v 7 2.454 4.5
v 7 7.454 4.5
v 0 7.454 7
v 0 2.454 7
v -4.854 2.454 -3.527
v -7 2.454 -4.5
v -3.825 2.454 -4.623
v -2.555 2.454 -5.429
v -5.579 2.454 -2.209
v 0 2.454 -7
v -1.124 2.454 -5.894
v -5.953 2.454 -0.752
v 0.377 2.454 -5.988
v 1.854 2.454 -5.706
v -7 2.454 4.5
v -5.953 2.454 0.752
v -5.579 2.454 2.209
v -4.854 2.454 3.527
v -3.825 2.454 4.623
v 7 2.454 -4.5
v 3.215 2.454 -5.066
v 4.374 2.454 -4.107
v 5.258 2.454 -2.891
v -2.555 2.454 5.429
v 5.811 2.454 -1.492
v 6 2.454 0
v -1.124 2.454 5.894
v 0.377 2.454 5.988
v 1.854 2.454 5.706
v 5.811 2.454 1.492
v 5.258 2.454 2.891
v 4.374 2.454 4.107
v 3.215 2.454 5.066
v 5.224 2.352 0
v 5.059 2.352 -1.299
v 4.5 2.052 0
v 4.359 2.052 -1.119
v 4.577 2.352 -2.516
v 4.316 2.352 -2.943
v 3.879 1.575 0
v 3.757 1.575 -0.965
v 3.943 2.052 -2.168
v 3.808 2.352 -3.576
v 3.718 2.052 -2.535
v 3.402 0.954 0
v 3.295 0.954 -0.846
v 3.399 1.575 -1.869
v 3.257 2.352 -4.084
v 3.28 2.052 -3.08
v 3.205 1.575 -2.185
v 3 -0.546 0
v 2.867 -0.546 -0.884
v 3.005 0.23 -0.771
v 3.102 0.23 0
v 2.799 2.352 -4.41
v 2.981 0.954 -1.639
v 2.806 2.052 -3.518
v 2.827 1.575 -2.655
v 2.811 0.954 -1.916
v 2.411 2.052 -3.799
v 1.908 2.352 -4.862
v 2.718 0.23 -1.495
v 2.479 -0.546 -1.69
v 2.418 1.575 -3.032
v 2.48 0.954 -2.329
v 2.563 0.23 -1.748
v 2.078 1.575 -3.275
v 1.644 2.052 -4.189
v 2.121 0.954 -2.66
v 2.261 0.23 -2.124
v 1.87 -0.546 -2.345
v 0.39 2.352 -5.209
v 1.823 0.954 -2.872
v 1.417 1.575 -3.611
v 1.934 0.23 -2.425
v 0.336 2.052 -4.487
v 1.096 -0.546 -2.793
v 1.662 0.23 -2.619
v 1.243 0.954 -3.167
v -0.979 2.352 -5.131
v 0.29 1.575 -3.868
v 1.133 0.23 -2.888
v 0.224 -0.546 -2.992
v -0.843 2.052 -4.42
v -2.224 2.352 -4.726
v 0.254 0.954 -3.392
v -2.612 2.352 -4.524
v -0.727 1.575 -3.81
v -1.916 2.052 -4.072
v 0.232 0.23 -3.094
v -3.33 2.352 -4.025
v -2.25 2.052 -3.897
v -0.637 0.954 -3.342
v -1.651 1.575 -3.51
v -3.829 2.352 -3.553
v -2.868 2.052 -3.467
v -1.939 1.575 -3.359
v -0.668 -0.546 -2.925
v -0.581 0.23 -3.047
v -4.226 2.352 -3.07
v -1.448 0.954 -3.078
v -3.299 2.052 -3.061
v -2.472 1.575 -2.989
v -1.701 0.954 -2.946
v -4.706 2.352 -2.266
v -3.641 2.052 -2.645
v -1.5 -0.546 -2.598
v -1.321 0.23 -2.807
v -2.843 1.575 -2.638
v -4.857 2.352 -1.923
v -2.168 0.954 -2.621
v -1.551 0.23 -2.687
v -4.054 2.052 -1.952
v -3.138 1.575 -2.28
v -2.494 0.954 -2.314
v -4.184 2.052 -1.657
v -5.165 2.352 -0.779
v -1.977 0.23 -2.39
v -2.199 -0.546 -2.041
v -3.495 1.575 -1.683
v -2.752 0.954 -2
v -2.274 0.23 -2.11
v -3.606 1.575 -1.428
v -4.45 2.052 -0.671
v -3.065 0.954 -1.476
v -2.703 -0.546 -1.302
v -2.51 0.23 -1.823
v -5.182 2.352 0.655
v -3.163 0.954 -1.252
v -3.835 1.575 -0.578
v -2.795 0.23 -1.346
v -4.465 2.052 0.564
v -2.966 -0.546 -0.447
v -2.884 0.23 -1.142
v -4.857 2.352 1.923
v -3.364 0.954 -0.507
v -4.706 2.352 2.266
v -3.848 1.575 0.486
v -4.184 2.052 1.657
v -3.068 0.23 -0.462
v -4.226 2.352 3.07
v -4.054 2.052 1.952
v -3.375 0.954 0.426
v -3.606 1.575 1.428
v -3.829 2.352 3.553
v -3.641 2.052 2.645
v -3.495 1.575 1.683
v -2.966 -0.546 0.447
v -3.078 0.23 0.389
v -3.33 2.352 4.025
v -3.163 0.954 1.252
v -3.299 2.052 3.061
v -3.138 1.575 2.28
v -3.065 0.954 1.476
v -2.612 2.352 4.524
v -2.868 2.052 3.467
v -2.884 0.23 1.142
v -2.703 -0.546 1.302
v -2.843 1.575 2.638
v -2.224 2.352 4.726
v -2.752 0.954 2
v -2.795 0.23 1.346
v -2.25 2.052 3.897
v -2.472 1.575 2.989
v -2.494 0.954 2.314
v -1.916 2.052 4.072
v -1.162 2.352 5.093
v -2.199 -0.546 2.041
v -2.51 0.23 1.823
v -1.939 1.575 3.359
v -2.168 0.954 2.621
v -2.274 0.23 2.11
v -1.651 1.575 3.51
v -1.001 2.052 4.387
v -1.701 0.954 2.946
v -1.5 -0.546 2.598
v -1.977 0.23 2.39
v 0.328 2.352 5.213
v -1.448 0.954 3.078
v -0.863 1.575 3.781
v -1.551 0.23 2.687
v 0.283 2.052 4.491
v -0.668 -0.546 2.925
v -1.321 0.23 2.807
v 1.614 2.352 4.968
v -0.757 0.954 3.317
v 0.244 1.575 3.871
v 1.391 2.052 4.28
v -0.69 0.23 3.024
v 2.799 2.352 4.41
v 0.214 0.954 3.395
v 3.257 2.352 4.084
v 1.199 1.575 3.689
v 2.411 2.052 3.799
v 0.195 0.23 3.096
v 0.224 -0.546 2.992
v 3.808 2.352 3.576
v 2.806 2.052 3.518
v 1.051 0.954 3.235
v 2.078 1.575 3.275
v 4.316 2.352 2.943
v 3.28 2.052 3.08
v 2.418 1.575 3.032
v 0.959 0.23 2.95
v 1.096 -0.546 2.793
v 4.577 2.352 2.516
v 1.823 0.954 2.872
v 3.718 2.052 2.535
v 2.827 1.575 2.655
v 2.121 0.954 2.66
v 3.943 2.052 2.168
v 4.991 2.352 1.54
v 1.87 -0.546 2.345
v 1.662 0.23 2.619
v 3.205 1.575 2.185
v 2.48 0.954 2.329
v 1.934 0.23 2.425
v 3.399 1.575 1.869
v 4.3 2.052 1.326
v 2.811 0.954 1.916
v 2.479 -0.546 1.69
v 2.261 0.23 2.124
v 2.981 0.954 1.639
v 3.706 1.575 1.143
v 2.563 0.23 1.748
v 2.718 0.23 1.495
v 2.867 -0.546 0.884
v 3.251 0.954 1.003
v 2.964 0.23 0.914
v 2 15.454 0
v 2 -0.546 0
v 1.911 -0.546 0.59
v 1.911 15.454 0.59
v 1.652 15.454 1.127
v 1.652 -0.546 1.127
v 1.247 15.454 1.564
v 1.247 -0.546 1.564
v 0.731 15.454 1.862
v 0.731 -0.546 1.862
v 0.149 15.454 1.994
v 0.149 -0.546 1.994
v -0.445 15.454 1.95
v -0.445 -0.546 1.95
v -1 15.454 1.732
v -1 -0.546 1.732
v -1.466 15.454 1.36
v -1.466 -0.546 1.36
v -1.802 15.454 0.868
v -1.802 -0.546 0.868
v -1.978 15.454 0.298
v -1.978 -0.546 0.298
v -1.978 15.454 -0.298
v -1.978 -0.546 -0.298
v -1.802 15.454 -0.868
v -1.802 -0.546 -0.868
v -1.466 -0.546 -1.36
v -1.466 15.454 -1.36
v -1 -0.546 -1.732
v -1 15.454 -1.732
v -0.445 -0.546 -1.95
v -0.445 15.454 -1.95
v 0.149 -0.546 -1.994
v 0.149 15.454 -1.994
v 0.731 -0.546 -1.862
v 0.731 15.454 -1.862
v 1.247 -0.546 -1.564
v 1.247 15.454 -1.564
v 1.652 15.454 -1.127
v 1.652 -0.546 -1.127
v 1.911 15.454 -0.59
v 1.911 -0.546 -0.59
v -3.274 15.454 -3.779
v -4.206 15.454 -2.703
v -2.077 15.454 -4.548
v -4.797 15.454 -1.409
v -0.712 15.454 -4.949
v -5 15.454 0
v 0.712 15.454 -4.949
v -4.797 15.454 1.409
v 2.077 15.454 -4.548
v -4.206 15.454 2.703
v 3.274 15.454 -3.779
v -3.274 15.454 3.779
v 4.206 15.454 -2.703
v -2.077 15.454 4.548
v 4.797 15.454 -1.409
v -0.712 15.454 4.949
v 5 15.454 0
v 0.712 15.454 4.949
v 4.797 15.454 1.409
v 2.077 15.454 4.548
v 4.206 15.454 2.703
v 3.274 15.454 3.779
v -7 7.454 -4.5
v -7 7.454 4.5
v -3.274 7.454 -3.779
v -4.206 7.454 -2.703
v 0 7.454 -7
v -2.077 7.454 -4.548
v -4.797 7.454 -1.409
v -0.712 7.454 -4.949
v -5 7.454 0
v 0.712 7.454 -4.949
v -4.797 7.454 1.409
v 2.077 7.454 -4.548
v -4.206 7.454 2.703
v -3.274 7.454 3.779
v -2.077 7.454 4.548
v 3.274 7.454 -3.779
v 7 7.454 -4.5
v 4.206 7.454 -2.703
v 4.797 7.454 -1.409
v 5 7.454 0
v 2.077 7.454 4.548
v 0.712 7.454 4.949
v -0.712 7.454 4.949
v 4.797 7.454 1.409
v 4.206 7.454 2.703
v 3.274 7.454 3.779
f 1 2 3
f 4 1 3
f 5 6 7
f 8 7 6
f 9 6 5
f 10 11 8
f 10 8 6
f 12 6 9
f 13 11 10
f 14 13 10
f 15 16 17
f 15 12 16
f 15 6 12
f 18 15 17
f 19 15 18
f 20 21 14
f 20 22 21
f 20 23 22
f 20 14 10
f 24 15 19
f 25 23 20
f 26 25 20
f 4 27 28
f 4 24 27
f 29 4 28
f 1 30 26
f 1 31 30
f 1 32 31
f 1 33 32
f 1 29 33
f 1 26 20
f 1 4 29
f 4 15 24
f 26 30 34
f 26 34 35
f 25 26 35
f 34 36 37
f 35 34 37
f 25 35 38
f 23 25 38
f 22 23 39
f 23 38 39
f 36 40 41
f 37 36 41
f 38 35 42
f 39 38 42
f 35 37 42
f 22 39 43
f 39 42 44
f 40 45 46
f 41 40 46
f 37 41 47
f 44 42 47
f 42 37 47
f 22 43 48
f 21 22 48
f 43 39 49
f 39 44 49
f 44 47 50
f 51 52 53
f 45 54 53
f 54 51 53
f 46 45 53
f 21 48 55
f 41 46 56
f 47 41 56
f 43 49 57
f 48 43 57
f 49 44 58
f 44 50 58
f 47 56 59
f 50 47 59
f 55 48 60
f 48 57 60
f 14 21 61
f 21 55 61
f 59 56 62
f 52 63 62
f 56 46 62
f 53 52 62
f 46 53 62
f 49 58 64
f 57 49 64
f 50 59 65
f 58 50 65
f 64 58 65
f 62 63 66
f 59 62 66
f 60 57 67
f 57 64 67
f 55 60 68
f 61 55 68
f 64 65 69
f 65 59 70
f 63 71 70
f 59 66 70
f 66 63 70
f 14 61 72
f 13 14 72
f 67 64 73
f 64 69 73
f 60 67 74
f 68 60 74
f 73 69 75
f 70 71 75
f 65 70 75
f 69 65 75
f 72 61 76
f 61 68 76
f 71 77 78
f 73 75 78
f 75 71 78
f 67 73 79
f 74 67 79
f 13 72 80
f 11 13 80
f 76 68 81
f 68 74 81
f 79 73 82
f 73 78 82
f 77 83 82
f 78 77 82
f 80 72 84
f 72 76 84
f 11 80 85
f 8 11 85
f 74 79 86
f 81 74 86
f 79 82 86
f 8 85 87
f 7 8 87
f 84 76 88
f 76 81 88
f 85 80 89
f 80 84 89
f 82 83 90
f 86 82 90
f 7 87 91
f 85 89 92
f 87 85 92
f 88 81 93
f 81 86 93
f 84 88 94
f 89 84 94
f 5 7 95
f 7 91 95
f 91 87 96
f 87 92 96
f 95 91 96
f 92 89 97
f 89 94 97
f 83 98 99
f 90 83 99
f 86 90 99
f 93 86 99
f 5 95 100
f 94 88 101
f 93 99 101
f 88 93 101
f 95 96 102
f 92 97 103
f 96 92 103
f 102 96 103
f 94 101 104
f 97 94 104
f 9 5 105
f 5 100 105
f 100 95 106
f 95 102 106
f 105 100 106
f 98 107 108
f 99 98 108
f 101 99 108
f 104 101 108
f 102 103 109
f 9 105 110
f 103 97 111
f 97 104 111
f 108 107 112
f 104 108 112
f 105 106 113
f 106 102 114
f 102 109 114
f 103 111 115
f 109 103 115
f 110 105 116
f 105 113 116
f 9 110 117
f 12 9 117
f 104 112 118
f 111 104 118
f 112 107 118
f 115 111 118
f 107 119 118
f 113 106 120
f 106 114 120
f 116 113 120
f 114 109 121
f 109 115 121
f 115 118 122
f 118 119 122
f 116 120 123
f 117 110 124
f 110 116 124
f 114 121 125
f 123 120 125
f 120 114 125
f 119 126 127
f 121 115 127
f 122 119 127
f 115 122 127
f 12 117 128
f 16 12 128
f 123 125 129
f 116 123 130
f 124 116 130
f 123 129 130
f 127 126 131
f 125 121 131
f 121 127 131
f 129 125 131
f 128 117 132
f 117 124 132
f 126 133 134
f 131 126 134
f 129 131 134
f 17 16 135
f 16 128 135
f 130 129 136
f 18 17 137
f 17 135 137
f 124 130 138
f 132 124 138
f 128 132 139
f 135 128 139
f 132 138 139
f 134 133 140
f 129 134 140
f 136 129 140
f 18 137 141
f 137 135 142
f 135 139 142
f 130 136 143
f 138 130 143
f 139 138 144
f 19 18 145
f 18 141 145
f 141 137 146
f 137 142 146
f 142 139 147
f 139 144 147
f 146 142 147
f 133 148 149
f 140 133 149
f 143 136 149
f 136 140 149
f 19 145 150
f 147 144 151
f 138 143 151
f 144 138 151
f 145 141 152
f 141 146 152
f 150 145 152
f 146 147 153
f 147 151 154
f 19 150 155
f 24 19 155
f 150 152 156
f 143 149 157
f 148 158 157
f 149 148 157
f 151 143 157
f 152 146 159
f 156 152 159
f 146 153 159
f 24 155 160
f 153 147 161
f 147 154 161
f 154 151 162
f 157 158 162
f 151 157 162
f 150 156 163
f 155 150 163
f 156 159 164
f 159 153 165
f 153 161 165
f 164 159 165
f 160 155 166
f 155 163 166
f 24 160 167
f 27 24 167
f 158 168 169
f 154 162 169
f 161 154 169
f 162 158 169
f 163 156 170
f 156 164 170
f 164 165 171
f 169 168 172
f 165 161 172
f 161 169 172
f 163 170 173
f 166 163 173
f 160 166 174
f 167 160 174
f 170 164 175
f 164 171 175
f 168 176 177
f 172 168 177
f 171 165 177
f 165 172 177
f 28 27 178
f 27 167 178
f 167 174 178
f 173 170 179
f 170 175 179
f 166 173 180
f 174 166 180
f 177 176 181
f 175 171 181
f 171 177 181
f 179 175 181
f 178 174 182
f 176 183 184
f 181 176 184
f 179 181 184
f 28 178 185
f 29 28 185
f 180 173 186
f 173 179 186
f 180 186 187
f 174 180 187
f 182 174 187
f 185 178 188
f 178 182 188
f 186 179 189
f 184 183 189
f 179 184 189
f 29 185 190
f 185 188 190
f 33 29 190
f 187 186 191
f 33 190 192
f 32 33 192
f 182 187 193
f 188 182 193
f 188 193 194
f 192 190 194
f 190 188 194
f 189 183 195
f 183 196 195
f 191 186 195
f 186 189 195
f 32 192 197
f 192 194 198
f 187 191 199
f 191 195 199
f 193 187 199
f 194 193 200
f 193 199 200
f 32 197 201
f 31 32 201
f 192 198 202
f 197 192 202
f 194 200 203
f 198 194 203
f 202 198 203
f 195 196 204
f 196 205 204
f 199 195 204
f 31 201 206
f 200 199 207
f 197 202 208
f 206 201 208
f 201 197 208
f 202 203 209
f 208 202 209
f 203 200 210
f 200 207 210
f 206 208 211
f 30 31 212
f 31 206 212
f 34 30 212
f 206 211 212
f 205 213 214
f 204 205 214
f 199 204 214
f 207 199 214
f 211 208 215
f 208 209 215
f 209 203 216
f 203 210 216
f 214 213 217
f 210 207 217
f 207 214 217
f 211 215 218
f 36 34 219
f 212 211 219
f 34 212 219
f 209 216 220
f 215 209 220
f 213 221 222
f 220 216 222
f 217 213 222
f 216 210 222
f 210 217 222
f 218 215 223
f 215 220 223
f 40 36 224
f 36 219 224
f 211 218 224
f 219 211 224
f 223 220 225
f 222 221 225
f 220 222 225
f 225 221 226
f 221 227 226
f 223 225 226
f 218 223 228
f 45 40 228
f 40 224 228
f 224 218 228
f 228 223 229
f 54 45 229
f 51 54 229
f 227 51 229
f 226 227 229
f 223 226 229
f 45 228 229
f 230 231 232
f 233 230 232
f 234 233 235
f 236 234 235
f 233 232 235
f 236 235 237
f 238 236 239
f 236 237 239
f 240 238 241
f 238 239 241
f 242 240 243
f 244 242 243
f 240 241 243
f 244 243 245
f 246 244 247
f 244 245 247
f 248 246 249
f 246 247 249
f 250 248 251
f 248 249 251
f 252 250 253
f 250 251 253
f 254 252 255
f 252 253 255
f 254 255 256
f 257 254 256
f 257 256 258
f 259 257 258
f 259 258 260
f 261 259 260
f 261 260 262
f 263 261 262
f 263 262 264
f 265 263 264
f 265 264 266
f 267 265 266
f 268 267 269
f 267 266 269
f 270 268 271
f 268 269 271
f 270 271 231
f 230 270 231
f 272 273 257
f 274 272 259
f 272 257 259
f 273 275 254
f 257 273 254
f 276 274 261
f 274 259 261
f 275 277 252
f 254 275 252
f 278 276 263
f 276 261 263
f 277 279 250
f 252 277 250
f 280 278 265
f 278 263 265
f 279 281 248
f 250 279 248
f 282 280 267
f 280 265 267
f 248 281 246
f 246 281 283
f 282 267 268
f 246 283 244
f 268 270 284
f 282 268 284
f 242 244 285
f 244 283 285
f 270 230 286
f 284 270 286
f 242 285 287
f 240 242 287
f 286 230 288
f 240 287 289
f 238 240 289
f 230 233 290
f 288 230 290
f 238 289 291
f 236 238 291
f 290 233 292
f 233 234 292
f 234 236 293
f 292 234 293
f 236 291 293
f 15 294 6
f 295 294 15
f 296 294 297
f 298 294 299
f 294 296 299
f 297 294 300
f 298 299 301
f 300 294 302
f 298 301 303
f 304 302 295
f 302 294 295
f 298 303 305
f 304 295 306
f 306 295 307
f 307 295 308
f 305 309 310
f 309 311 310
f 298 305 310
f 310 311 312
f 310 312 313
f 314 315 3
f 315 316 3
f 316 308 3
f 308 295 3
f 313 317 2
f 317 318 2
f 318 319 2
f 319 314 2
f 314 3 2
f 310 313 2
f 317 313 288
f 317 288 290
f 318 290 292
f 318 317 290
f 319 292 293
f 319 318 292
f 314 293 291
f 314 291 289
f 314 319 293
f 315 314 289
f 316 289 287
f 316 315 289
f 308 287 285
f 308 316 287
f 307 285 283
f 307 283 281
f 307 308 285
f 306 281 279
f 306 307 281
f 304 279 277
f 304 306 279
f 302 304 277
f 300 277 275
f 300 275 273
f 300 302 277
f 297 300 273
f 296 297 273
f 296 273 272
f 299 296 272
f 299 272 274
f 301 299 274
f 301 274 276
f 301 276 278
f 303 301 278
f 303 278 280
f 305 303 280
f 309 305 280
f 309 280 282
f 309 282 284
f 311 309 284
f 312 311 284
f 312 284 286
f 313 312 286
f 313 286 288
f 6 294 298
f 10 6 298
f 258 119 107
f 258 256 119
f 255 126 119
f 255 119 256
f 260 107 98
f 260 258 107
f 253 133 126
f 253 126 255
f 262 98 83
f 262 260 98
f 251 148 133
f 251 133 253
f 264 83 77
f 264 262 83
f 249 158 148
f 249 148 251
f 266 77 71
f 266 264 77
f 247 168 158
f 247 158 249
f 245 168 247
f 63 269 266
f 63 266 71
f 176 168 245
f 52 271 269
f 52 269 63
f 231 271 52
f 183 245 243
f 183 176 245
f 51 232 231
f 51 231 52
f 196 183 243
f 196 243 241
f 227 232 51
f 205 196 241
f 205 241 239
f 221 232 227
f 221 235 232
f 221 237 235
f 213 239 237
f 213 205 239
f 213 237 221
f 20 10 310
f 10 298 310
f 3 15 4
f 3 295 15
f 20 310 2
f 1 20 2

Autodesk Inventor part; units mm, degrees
ref_plane "YZ Plane" through (0, 0, 0) normal (1, 0, 0) x (0, 1, 0)
ref_plane "XZ Plane" through (0, 0, 0) normal (0, 1, 0) x (-1, 0, 0)
ref_plane "XY Plane" through (0, 0, 0) normal (0, 0, 1) x (1, 0, 0)
sketch "Boceto1" plane through (0, 0, 0) normal (0, 0, 1) x (1, 0, 0)
  line L0 (0, 21.3006) -> (0, 0)
  line L1 (0, 15.4538) -> (5, 15.4538)
  line L2 (5, 15.4538) -> (5, 7.4538)
  line L3 (5, 7.4538) -> (0, 7.4538)
  line L4 (7, 7.4538) -> (5, 7.4538)
  line L5 (7, 7.4538) -> (7, 2.4538)
  line L6 (7, 2.4538) -> (0, 2.4538)
  line L7 (3, 2.4538) -> (3, 0.9538)
  line L8 (2, 15.4538) -> (2, -0.5462)
  line L9 (3, -0.5462) -> (2, -0.5462)
  line L10 (0, 0.6254) -> (0, -1.387)
  line L11 (3, -0.5462) -> (3, -0.5462)
  arc A0 (6, 2.4538) -> (3, -0.5462) centre (6, -0.5462) ccw
  line L12 (3, 0.9538) -> (3, -0.5462)
  point P0 (2, 2.4538)
  point P1 (2, 7.4538)
  dimension "d0" = 10
  dimension "d1" = 4
  dimension "d2" = 14
  dimension "d4" = 5
  dimension "d6" = 8
  dimension "d9" = 15.4538
  dimension "d10" = 13.8468
  dimension "d11" = 1.8283
  dimension "d12" = 3.8408
  dimension "d16" = 3
  dimension "d17" = 1
  dimension "d18" = 4
  dimension "d19" = 0.5462
  dimension "d20" = 6
  dimension "d21" = 1
revolve "Revolución1" add sketch "Boceto1" angle 360 about axis through (0, 21.3006, 0) along (0, -1, 0) contours L1 L2 L3 L8 | L3 L4 L5 L6 L8 | L6 L7 L12 L9 L8
revolve "Revolución2" add sketch "Boceto1" angle 360 about axis through (0, 0.6254, 0) along (0, -1, 0) contours L6 A0 L12 L7
sketch "Boceto2" plane through (0, 7.4538, 0) normal (0, 1, 0) x (1, 0, 0)
  line L0 (0, 11.3393) -> (0, -11.3393) construction
  line L1 (-23.3185, 0) -> (23.3185, 0) construction
  line L2 (7, 4.5) -> (7, -4.5)
  line L3 (-7, 4.5) -> (-7, -4.5)
  circle A0 centre (0, 0) radius 7 projected
  line L4 (-7, 4.5) -> (0, 7)
  line L5 (0, 7) -> (7, 4.5)
  line L6 (-7, -4.5) -> (0, -7)
  line L7 (7, -4.5) -> (0, -7)
  arc A1 (0, 7) -> (-4.4344, 5.4163) centre (0, 0) ccw
  arc A2 (4.4344, 5.4163) -> (0, 7) centre (0, 0) ccw
  arc A3 (0, -7) -> (4.4344, -5.4163) centre (0, 0) ccw
  arc A4 (-4.4344, -5.4163) -> (0, -7) centre (0, 0) ccw
  point P0 (7, 0)
  point P1 (-7, 0)
  point P2 (0, -7)
  point P3 (0, -7)
  point P4 (0, 7)
  point P5 (0, 7)
  point P6 (7, 0)
  point P7 (-7, 0)
  dimension "d24" = 9
  dimension "d26" = 9
  dimension "d27" = 7
  dimension "d28" = 7
extrude "Extrusión1" cut sketch "Boceto2" against normal through all contours A0 L7 | A0 L6
extrude "Extrusión2" cut sketch "Boceto2" against normal through all contours L5 A0 | L4 A0
extrude "Extrusión3" add sketch "Boceto2" against normal blind 5 contours L2 A0 L5 | L2 L7 A0 | A0 L3 L4 | L6 L3 A0
thread "Rosca1" size "M10x1.25" class "6g" standard "ANSI Metric M Profile" length 14
properties part number "1-HUDSON-8-30-TDR HAND PUMP BODY BOTTOM INLET"
